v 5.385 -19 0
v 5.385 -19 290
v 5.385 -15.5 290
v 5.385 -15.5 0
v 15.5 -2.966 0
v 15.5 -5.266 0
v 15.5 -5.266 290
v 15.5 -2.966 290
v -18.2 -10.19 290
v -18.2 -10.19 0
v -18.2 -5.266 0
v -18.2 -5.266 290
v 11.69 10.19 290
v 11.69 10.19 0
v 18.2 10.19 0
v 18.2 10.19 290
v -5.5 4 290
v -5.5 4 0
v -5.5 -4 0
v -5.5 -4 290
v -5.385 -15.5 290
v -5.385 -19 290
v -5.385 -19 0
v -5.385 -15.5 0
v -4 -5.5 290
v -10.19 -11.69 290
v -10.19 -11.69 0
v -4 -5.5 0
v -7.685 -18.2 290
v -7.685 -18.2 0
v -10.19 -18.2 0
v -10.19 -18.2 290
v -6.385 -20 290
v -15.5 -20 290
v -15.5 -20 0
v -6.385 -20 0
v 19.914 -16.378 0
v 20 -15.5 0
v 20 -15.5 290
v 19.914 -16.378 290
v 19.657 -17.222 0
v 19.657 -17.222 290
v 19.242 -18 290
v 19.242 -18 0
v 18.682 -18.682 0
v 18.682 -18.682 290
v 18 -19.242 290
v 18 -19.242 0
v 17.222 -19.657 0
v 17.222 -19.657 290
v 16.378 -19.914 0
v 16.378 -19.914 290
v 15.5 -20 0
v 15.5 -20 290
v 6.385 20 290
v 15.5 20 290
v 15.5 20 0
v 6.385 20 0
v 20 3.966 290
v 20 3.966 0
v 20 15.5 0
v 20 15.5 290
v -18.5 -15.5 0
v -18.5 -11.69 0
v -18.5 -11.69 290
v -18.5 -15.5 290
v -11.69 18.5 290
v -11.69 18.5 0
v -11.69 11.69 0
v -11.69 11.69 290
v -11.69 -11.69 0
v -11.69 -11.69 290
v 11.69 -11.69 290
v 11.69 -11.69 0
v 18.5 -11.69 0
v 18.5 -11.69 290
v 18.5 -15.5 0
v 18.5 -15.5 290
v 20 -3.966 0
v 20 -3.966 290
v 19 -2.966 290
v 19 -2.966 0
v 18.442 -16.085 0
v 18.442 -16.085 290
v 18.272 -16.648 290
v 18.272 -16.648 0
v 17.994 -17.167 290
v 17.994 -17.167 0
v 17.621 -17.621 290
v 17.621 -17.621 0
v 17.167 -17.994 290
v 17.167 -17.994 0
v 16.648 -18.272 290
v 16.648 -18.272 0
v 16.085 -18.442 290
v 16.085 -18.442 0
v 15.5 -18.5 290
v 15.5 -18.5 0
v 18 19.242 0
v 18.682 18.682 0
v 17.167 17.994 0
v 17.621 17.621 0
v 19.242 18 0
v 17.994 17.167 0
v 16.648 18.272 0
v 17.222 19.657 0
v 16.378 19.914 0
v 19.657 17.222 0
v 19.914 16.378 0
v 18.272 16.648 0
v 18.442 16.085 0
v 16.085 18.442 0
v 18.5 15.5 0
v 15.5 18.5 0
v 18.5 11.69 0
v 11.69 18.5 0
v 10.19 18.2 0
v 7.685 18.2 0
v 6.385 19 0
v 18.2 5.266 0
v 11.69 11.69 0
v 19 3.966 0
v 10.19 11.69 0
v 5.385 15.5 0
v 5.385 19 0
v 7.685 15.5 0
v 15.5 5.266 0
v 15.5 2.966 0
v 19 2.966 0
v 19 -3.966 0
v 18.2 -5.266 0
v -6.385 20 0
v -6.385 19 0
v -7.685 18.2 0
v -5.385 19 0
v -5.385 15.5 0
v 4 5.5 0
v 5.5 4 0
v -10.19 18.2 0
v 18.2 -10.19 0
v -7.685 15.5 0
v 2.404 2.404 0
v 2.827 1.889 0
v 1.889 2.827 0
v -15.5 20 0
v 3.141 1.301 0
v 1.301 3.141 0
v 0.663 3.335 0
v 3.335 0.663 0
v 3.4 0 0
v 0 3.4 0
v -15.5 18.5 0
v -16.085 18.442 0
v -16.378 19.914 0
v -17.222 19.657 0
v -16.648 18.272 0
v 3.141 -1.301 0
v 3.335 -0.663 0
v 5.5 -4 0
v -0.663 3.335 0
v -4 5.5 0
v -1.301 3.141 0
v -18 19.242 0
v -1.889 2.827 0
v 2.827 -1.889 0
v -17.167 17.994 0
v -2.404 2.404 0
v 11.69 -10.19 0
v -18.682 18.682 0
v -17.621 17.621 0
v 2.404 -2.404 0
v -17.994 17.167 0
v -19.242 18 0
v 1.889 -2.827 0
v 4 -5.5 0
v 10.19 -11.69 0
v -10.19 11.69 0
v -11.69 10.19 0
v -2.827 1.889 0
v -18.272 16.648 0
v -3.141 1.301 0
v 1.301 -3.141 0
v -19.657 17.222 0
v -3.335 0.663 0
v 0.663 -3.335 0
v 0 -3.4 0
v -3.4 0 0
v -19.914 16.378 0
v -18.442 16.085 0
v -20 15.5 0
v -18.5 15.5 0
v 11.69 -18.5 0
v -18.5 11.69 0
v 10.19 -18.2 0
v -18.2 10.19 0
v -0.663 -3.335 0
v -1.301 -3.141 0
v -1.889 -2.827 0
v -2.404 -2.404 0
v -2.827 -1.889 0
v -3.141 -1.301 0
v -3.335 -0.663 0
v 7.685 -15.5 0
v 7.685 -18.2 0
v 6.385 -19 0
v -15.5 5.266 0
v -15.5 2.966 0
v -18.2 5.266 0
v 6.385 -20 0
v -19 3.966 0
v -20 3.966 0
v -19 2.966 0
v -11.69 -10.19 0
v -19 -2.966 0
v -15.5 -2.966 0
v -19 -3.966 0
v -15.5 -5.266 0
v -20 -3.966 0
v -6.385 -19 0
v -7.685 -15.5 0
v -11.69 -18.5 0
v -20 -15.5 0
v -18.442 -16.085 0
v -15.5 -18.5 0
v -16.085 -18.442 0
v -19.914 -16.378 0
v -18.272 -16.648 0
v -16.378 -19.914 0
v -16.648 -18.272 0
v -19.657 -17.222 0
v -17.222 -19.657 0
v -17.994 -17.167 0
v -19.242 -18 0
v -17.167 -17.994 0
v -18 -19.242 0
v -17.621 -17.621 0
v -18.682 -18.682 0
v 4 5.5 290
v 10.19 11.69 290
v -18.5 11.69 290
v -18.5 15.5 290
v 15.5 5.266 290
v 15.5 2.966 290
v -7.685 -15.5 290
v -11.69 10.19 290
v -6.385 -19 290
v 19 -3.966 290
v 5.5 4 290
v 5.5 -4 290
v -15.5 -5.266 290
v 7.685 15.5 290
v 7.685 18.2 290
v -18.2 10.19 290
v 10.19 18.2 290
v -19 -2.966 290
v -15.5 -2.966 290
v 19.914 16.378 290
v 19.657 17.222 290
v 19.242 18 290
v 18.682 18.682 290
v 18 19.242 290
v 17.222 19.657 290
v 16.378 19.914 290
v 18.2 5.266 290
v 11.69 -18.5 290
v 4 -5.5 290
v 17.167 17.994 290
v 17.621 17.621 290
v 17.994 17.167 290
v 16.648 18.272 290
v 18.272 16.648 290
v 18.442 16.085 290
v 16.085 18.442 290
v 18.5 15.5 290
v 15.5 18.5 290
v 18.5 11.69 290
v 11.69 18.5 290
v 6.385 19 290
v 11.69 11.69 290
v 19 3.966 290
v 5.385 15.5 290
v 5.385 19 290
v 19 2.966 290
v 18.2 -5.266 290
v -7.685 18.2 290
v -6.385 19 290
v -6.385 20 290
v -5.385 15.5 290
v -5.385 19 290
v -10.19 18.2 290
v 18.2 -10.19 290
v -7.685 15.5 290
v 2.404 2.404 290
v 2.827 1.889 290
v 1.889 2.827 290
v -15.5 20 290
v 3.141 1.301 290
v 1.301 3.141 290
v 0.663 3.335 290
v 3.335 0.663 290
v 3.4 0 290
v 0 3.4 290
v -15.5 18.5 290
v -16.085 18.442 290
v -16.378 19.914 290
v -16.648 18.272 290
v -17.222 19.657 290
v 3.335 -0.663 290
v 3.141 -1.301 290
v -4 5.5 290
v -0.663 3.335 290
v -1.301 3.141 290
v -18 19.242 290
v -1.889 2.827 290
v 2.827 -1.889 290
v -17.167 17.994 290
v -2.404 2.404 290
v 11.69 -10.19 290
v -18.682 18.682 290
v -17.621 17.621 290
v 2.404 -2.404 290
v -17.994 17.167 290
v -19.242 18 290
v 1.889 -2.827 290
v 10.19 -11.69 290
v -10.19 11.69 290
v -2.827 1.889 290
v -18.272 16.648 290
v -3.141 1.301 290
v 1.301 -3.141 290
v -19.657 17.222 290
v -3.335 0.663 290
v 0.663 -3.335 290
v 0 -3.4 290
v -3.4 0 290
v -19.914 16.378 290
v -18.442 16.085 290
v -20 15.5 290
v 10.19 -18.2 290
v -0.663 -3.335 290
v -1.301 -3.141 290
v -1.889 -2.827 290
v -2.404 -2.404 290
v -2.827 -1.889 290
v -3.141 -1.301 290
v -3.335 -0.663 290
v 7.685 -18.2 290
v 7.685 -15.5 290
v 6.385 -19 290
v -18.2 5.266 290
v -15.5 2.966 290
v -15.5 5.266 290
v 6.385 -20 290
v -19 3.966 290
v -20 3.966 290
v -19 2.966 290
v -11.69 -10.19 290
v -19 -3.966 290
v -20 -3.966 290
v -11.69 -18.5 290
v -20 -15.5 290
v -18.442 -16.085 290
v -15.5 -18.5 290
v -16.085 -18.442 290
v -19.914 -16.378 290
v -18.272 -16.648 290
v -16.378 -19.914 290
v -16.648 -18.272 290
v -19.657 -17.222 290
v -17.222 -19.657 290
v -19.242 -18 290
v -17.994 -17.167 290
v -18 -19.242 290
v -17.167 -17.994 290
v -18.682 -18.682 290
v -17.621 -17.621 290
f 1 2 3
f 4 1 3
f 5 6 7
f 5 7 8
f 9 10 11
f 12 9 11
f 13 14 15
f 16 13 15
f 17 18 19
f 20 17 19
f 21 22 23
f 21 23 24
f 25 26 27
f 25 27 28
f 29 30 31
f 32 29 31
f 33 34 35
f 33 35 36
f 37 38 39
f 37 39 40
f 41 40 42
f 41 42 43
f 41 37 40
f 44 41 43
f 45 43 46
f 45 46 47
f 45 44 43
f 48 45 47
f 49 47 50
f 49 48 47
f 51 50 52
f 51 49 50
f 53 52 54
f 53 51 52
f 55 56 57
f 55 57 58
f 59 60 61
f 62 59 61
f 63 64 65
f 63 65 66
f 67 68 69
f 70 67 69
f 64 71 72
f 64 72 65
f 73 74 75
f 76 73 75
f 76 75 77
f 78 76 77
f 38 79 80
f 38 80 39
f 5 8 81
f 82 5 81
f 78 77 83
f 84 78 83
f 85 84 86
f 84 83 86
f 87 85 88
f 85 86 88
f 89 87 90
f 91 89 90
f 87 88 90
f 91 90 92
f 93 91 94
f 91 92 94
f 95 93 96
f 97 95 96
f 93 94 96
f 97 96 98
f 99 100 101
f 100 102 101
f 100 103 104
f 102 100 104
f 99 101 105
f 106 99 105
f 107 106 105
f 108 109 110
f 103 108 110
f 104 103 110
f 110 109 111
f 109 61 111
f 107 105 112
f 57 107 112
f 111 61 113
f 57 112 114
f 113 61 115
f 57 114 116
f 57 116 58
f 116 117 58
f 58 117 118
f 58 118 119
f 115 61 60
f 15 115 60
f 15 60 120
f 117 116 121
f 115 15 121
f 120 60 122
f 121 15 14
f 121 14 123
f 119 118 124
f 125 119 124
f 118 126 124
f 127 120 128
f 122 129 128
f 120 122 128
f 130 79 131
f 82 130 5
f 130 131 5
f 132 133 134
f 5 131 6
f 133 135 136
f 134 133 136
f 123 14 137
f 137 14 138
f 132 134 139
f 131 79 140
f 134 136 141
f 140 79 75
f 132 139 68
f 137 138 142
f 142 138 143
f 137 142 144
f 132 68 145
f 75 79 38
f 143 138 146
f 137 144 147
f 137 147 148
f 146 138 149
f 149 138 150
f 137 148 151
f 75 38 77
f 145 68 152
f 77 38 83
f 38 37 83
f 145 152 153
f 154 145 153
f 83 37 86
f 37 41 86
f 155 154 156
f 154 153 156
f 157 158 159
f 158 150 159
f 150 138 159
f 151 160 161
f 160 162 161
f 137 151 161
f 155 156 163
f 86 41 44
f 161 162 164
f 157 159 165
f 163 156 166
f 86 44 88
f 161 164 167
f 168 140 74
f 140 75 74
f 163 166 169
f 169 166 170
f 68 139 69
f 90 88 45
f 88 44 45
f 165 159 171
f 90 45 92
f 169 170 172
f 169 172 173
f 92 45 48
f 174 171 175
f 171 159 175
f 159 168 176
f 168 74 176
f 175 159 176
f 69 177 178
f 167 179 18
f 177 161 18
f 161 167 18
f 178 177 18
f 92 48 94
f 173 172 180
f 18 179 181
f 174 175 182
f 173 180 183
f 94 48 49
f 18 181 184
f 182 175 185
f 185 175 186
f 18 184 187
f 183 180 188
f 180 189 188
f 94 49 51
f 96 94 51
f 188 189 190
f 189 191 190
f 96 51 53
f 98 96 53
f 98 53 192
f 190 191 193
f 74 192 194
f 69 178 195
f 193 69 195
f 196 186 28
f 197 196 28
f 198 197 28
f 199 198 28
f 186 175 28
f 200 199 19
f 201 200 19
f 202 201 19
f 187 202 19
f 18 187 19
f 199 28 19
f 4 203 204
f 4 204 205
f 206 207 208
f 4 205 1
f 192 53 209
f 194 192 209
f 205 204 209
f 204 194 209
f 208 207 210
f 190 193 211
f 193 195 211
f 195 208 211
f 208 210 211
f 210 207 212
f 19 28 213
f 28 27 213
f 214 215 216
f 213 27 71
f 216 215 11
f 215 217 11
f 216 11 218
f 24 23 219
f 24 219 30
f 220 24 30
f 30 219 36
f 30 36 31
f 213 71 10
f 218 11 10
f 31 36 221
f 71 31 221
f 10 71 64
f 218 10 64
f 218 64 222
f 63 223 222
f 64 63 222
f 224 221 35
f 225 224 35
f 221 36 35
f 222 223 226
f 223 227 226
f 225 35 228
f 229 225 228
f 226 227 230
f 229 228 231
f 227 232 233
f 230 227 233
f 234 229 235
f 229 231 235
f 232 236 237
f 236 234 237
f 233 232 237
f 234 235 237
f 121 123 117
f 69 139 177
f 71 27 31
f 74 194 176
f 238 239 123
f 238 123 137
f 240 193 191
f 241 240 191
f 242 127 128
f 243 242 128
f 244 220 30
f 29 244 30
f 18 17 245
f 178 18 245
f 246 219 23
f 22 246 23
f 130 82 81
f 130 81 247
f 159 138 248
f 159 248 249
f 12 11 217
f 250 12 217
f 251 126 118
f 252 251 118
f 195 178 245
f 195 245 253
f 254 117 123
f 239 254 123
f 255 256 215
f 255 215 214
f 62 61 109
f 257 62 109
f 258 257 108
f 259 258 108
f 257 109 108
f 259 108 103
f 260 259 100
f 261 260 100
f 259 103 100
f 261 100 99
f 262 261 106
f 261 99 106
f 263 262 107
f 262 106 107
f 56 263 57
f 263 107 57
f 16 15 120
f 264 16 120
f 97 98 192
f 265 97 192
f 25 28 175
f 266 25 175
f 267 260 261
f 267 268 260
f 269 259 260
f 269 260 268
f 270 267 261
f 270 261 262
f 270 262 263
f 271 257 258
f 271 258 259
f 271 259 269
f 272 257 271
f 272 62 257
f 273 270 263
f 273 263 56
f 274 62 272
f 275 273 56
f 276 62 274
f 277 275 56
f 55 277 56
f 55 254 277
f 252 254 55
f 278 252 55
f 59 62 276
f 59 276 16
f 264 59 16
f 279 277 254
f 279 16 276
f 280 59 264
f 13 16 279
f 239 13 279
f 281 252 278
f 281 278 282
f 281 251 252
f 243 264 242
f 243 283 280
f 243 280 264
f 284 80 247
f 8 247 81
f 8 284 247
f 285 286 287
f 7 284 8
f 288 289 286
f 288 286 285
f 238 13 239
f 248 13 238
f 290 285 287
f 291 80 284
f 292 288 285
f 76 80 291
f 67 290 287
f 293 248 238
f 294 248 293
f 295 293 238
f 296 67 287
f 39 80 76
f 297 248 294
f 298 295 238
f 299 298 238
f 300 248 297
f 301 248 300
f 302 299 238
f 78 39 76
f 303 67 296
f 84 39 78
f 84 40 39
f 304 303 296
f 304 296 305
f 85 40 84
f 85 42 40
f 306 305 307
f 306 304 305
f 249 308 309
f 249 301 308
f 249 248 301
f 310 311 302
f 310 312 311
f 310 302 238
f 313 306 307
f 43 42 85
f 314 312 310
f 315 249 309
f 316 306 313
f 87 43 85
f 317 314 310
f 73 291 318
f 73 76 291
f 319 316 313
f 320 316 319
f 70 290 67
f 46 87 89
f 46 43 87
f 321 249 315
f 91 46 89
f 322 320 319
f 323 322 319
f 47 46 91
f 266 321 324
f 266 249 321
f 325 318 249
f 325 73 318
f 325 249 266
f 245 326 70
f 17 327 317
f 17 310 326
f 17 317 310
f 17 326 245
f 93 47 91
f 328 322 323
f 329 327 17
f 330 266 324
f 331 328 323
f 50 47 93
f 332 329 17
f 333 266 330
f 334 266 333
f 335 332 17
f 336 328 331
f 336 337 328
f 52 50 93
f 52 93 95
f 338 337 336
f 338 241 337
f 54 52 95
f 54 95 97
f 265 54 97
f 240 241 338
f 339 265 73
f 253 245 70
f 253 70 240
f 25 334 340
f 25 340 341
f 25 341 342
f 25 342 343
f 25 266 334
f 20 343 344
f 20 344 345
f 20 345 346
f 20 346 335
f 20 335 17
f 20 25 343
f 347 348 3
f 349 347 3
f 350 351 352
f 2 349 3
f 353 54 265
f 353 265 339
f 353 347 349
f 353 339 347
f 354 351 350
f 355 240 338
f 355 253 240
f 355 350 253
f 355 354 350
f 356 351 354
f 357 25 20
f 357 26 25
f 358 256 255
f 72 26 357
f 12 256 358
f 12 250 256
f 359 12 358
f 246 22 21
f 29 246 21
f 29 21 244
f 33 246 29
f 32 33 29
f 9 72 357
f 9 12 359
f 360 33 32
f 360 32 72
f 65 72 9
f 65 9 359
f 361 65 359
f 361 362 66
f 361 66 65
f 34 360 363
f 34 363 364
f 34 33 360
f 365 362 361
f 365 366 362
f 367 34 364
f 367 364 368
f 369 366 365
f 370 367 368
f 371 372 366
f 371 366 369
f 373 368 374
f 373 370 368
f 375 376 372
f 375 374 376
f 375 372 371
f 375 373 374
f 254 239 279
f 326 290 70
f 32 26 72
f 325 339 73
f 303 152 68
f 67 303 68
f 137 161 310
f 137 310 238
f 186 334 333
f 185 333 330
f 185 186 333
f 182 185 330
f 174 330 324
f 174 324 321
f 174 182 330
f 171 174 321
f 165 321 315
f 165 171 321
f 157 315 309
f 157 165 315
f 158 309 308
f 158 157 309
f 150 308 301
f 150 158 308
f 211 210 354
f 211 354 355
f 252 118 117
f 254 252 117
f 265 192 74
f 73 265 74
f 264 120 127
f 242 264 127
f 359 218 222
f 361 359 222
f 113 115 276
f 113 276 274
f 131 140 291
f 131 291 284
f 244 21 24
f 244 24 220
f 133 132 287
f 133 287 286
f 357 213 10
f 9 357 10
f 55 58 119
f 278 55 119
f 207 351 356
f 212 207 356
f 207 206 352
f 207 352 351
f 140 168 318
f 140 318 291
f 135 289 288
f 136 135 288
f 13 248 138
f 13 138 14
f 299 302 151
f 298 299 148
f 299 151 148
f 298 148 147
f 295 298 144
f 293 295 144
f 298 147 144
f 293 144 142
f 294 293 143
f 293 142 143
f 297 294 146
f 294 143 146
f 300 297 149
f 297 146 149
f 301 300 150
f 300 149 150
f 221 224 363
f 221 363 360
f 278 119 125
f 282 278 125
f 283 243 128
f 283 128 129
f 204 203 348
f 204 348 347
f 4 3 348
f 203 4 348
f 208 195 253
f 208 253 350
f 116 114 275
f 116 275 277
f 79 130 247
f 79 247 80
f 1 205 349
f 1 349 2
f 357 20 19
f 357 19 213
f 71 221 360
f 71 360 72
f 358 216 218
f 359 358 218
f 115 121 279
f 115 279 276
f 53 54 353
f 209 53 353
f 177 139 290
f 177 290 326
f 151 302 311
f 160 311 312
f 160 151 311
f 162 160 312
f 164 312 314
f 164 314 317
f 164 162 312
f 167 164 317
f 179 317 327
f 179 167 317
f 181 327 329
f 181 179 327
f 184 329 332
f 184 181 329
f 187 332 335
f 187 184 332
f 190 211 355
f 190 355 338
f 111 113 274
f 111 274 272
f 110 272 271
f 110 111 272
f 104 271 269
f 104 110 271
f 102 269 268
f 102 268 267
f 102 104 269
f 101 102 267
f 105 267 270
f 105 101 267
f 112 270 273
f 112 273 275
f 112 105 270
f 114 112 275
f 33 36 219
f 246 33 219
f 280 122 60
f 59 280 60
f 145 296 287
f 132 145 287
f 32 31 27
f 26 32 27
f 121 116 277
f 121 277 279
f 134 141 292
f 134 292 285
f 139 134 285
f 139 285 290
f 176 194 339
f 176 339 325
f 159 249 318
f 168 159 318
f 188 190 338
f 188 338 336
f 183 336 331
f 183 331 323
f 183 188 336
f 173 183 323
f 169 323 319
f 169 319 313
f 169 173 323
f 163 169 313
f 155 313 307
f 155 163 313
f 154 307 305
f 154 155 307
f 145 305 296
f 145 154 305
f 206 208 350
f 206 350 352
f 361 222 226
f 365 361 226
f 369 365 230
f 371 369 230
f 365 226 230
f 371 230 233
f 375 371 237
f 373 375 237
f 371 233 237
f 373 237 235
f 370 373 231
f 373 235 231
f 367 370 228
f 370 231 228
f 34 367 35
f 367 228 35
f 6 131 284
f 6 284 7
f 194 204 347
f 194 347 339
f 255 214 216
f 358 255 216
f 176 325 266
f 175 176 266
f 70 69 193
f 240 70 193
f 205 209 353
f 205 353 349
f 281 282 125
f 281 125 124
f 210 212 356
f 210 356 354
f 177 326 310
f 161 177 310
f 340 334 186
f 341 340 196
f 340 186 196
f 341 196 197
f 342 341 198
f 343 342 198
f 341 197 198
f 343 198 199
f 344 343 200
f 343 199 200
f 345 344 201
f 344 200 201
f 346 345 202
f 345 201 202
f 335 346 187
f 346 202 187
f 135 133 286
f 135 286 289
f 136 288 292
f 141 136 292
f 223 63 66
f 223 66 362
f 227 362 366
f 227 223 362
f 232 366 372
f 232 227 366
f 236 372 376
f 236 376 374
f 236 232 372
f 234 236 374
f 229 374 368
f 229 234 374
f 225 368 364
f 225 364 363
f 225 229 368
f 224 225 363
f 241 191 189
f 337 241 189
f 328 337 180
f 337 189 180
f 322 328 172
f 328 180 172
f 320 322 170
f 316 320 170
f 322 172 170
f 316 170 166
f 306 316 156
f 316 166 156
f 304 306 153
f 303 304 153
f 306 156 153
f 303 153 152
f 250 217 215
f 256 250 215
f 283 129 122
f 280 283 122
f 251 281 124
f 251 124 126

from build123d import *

# Parameters (mm, degrees)
BOSS_EXTRUDE1_DEPTH  = 290
MIRROR3_COPY_1_DEPTH = 290
MIRROR3_COPY_2_DEPTH = 290


with BuildPart() as part:
    # Sketch1 → Boss-Extrude1 (new body)
    with BuildSketch(Plane.XY):
        with BuildLine():
            Line((3.4, 0), (5.5, 0))
            Line((5.5, 0), (5.5, 4))
            Line((5.5, 4), (11.69, 10.19))
            Line((11.69, 10.19), (18.2, 10.19))
            Line((18.2, 10.19), (18.2, 5.265595036))
            Line((18.2, 5.265595036), (15.5, 5.265595036))
            Line((15.5, 5.265595036), (15.5, 2.965595036))
            Line((15.5, 2.965595036), (19, 2.965595036))
            Line((19, 2.965595036), (19, 3.965595036))
            Line((19, 3.965595036), (20, 3.965595036))
            Line((20, 3.965595036), (20, 15.5))
            ThreePointArc((20, 15.5), (18.681980515, 18.681980515), (15.5, 20))
            Line((15.5, 20), (6.385304712, 20))
            Line((6.385304712, 20), (6.385304712, 19))
            Line((6.385304712, 19), (5.385304712, 19))
            Line((5.385304712, 19), (5.385304712, 15.5))
            Line((5.385304712, 15.5), (7.685304712, 15.5))
            Line((7.685304712, 15.5), (7.685304712, 18.2))
            Line((7.685304712, 18.2), (10.19, 18.2))
            Line((10.19, 18.2), (10.19, 11.69))
            Line((10.19, 11.69), (4, 5.5))
            Line((4, 5.5), (0, 5.5))
            Line((0, 5.5), (0, 3.4))
            ThreePointArc((0, 3.4), (2.404163056, 2.404163056), (3.4, 0))
        make_face()
        with BuildLine():
            Line((18.5, 11.69), (18.5, 15.5))
            ThreePointArc((18.5, 15.5), (17.621320344, 17.621320344), (15.5, 18.5))
            Line((15.5, 18.5), (11.69, 18.5))
            Line((11.69, 18.5), (11.69, 11.69))
            Line((11.69, 11.69), (18.5, 11.69))
        make_face(mode=Mode.SUBTRACT)
    boss_extrude1 = extrude(amount=BOSS_EXTRUDE1_DEPTH)

    # Mirror1: Boss-Extrude1 across plane
    add(boss_extrude1.mirror(Plane.ZX))

    # Mirror2: Boss-Extrude1 across plane
    add(boss_extrude1.mirror(Plane(origin=(0, 0, 0), x_dir=(0, 0, 1), z_dir=(1, 0, 0))))

    # Mirror3 copy 1 sketch → Mirror3 copy 1 (add)
    with BuildSketch(Plane(origin=(0, 0, 0), x_dir=(-1, 0, 0), z_dir=(0, 0, 1))):
        with BuildLine():
            Line((3.4, 0), (5.5, 0))
            Line((5.5, 0), (5.5, 4))
            Line((5.5, 4), (11.69, 10.19))
            Line((11.69, 10.19), (18.2, 10.19))
            Line((18.2, 10.19), (18.2, 5.265595036))
            Line((18.2, 5.265595036), (15.5, 5.265595036))
            Line((15.5, 5.265595036), (15.5, 2.965595036))
            Line((15.5, 2.965595036), (19, 2.965595036))
            Line((19, 2.965595036), (19, 3.965595036))
            Line((19, 3.965595036), (20, 3.965595036))
            Line((20, 3.965595036), (20, 15.5))
            ThreePointArc((20, 15.5), (18.681980515, 18.681980515), (15.5, 20))
            Line((15.5, 20), (6.385304712, 20))
            Line((6.385304712, 20), (6.385304712, 19))
            Line((6.385304712, 19), (5.385304712, 19))
            Line((5.385304712, 19), (5.385304712, 15.5))
            Line((5.385304712, 15.5), (7.685304712, 15.5))
            Line((7.685304712, 15.5), (7.685304712, 18.2))
            Line((7.685304712, 18.2), (10.19, 18.2))
            Line((10.19, 18.2), (10.19, 11.69))
            Line((10.19, 11.69), (4, 5.5))
            Line((4, 5.5), (0, 5.5))
            Line((0, 5.5), (0, 3.4))
            ThreePointArc((0, 3.4), (2.404163056, 2.404163056), (3.4, 0))
        make_face()
        with BuildLine():
            Line((18.5, 11.69), (18.5, 15.5))
            ThreePointArc((18.5, 15.5), (17.621320344, 17.621320344), (15.5, 18.5))
            Line((15.5, 18.5), (11.69, 18.5))
            Line((11.69, 18.5), (11.69, 11.69))
            Line((11.69, 11.69), (18.5, 11.69))
        make_face(mode=Mode.SUBTRACT)
    extrude(amount=MIRROR3_COPY_1_DEPTH)

    # Mirror3 copy 2 sketch → Mirror3 copy 2 (add)
    with BuildSketch(Plane.XY):
        with BuildLine():
            Line((3.4, 0), (5.5, 0))
            Line((5.5, 0), (5.5, -4))
            Line((5.5, -4), (11.69, -10.19))
            Line((11.69, -10.19), (18.2, -10.19))
            Line((18.2, -10.19), (18.2, -5.265595036))
            Line((18.2, -5.265595036), (15.5, -5.265595036))
            Line((15.5, -5.265595036), (15.5, -2.965595036))
            Line((15.5, -2.965595036), (19, -2.965595036))
            Line((19, -2.965595036), (19, -3.965595036))
            Line((19, -3.965595036), (20, -3.965595036))
            Line((20, -3.965595036), (20, -15.5))
            ThreePointArc((20, -15.5), (18.681980515, -18.681980515), (15.5, -20))
            Line((15.5, -20), (6.385304712, -20))
            Line((6.385304712, -20), (6.385304712, -19))
            Line((6.385304712, -19), (5.385304712, -19))
            Line((5.385304712, -19), (5.385304712, -15.5))
            Line((5.385304712, -15.5), (7.685304712, -15.5))
            Line((7.685304712, -15.5), (7.685304712, -18.2))
            Line((7.685304712, -18.2), (10.19, -18.2))
            Line((10.19, -18.2), (10.19, -11.69))
            Line((10.19, -11.69), (4, -5.5))
            Line((4, -5.5), (0, -5.5))
            Line((0, -5.5), (0, -3.4))
            ThreePointArc((0, -3.4), (2.404163056, -2.404163056), (3.4, 0))
        make_face()
        with BuildLine():
            Line((18.5, -11.69), (18.5, -15.5))
            ThreePointArc((18.5, -15.5), (17.621320344, -17.621320344), (15.5, -18.5))
            Line((15.5, -18.5), (11.69, -18.5))
            Line((11.69, -18.5), (11.69, -11.69))
            Line((11.69, -11.69), (18.5, -11.69))
        make_face(mode=Mode.SUBTRACT)
    extrude(amount=MIRROR3_COPY_2_DEPTH)


solid = part.part
